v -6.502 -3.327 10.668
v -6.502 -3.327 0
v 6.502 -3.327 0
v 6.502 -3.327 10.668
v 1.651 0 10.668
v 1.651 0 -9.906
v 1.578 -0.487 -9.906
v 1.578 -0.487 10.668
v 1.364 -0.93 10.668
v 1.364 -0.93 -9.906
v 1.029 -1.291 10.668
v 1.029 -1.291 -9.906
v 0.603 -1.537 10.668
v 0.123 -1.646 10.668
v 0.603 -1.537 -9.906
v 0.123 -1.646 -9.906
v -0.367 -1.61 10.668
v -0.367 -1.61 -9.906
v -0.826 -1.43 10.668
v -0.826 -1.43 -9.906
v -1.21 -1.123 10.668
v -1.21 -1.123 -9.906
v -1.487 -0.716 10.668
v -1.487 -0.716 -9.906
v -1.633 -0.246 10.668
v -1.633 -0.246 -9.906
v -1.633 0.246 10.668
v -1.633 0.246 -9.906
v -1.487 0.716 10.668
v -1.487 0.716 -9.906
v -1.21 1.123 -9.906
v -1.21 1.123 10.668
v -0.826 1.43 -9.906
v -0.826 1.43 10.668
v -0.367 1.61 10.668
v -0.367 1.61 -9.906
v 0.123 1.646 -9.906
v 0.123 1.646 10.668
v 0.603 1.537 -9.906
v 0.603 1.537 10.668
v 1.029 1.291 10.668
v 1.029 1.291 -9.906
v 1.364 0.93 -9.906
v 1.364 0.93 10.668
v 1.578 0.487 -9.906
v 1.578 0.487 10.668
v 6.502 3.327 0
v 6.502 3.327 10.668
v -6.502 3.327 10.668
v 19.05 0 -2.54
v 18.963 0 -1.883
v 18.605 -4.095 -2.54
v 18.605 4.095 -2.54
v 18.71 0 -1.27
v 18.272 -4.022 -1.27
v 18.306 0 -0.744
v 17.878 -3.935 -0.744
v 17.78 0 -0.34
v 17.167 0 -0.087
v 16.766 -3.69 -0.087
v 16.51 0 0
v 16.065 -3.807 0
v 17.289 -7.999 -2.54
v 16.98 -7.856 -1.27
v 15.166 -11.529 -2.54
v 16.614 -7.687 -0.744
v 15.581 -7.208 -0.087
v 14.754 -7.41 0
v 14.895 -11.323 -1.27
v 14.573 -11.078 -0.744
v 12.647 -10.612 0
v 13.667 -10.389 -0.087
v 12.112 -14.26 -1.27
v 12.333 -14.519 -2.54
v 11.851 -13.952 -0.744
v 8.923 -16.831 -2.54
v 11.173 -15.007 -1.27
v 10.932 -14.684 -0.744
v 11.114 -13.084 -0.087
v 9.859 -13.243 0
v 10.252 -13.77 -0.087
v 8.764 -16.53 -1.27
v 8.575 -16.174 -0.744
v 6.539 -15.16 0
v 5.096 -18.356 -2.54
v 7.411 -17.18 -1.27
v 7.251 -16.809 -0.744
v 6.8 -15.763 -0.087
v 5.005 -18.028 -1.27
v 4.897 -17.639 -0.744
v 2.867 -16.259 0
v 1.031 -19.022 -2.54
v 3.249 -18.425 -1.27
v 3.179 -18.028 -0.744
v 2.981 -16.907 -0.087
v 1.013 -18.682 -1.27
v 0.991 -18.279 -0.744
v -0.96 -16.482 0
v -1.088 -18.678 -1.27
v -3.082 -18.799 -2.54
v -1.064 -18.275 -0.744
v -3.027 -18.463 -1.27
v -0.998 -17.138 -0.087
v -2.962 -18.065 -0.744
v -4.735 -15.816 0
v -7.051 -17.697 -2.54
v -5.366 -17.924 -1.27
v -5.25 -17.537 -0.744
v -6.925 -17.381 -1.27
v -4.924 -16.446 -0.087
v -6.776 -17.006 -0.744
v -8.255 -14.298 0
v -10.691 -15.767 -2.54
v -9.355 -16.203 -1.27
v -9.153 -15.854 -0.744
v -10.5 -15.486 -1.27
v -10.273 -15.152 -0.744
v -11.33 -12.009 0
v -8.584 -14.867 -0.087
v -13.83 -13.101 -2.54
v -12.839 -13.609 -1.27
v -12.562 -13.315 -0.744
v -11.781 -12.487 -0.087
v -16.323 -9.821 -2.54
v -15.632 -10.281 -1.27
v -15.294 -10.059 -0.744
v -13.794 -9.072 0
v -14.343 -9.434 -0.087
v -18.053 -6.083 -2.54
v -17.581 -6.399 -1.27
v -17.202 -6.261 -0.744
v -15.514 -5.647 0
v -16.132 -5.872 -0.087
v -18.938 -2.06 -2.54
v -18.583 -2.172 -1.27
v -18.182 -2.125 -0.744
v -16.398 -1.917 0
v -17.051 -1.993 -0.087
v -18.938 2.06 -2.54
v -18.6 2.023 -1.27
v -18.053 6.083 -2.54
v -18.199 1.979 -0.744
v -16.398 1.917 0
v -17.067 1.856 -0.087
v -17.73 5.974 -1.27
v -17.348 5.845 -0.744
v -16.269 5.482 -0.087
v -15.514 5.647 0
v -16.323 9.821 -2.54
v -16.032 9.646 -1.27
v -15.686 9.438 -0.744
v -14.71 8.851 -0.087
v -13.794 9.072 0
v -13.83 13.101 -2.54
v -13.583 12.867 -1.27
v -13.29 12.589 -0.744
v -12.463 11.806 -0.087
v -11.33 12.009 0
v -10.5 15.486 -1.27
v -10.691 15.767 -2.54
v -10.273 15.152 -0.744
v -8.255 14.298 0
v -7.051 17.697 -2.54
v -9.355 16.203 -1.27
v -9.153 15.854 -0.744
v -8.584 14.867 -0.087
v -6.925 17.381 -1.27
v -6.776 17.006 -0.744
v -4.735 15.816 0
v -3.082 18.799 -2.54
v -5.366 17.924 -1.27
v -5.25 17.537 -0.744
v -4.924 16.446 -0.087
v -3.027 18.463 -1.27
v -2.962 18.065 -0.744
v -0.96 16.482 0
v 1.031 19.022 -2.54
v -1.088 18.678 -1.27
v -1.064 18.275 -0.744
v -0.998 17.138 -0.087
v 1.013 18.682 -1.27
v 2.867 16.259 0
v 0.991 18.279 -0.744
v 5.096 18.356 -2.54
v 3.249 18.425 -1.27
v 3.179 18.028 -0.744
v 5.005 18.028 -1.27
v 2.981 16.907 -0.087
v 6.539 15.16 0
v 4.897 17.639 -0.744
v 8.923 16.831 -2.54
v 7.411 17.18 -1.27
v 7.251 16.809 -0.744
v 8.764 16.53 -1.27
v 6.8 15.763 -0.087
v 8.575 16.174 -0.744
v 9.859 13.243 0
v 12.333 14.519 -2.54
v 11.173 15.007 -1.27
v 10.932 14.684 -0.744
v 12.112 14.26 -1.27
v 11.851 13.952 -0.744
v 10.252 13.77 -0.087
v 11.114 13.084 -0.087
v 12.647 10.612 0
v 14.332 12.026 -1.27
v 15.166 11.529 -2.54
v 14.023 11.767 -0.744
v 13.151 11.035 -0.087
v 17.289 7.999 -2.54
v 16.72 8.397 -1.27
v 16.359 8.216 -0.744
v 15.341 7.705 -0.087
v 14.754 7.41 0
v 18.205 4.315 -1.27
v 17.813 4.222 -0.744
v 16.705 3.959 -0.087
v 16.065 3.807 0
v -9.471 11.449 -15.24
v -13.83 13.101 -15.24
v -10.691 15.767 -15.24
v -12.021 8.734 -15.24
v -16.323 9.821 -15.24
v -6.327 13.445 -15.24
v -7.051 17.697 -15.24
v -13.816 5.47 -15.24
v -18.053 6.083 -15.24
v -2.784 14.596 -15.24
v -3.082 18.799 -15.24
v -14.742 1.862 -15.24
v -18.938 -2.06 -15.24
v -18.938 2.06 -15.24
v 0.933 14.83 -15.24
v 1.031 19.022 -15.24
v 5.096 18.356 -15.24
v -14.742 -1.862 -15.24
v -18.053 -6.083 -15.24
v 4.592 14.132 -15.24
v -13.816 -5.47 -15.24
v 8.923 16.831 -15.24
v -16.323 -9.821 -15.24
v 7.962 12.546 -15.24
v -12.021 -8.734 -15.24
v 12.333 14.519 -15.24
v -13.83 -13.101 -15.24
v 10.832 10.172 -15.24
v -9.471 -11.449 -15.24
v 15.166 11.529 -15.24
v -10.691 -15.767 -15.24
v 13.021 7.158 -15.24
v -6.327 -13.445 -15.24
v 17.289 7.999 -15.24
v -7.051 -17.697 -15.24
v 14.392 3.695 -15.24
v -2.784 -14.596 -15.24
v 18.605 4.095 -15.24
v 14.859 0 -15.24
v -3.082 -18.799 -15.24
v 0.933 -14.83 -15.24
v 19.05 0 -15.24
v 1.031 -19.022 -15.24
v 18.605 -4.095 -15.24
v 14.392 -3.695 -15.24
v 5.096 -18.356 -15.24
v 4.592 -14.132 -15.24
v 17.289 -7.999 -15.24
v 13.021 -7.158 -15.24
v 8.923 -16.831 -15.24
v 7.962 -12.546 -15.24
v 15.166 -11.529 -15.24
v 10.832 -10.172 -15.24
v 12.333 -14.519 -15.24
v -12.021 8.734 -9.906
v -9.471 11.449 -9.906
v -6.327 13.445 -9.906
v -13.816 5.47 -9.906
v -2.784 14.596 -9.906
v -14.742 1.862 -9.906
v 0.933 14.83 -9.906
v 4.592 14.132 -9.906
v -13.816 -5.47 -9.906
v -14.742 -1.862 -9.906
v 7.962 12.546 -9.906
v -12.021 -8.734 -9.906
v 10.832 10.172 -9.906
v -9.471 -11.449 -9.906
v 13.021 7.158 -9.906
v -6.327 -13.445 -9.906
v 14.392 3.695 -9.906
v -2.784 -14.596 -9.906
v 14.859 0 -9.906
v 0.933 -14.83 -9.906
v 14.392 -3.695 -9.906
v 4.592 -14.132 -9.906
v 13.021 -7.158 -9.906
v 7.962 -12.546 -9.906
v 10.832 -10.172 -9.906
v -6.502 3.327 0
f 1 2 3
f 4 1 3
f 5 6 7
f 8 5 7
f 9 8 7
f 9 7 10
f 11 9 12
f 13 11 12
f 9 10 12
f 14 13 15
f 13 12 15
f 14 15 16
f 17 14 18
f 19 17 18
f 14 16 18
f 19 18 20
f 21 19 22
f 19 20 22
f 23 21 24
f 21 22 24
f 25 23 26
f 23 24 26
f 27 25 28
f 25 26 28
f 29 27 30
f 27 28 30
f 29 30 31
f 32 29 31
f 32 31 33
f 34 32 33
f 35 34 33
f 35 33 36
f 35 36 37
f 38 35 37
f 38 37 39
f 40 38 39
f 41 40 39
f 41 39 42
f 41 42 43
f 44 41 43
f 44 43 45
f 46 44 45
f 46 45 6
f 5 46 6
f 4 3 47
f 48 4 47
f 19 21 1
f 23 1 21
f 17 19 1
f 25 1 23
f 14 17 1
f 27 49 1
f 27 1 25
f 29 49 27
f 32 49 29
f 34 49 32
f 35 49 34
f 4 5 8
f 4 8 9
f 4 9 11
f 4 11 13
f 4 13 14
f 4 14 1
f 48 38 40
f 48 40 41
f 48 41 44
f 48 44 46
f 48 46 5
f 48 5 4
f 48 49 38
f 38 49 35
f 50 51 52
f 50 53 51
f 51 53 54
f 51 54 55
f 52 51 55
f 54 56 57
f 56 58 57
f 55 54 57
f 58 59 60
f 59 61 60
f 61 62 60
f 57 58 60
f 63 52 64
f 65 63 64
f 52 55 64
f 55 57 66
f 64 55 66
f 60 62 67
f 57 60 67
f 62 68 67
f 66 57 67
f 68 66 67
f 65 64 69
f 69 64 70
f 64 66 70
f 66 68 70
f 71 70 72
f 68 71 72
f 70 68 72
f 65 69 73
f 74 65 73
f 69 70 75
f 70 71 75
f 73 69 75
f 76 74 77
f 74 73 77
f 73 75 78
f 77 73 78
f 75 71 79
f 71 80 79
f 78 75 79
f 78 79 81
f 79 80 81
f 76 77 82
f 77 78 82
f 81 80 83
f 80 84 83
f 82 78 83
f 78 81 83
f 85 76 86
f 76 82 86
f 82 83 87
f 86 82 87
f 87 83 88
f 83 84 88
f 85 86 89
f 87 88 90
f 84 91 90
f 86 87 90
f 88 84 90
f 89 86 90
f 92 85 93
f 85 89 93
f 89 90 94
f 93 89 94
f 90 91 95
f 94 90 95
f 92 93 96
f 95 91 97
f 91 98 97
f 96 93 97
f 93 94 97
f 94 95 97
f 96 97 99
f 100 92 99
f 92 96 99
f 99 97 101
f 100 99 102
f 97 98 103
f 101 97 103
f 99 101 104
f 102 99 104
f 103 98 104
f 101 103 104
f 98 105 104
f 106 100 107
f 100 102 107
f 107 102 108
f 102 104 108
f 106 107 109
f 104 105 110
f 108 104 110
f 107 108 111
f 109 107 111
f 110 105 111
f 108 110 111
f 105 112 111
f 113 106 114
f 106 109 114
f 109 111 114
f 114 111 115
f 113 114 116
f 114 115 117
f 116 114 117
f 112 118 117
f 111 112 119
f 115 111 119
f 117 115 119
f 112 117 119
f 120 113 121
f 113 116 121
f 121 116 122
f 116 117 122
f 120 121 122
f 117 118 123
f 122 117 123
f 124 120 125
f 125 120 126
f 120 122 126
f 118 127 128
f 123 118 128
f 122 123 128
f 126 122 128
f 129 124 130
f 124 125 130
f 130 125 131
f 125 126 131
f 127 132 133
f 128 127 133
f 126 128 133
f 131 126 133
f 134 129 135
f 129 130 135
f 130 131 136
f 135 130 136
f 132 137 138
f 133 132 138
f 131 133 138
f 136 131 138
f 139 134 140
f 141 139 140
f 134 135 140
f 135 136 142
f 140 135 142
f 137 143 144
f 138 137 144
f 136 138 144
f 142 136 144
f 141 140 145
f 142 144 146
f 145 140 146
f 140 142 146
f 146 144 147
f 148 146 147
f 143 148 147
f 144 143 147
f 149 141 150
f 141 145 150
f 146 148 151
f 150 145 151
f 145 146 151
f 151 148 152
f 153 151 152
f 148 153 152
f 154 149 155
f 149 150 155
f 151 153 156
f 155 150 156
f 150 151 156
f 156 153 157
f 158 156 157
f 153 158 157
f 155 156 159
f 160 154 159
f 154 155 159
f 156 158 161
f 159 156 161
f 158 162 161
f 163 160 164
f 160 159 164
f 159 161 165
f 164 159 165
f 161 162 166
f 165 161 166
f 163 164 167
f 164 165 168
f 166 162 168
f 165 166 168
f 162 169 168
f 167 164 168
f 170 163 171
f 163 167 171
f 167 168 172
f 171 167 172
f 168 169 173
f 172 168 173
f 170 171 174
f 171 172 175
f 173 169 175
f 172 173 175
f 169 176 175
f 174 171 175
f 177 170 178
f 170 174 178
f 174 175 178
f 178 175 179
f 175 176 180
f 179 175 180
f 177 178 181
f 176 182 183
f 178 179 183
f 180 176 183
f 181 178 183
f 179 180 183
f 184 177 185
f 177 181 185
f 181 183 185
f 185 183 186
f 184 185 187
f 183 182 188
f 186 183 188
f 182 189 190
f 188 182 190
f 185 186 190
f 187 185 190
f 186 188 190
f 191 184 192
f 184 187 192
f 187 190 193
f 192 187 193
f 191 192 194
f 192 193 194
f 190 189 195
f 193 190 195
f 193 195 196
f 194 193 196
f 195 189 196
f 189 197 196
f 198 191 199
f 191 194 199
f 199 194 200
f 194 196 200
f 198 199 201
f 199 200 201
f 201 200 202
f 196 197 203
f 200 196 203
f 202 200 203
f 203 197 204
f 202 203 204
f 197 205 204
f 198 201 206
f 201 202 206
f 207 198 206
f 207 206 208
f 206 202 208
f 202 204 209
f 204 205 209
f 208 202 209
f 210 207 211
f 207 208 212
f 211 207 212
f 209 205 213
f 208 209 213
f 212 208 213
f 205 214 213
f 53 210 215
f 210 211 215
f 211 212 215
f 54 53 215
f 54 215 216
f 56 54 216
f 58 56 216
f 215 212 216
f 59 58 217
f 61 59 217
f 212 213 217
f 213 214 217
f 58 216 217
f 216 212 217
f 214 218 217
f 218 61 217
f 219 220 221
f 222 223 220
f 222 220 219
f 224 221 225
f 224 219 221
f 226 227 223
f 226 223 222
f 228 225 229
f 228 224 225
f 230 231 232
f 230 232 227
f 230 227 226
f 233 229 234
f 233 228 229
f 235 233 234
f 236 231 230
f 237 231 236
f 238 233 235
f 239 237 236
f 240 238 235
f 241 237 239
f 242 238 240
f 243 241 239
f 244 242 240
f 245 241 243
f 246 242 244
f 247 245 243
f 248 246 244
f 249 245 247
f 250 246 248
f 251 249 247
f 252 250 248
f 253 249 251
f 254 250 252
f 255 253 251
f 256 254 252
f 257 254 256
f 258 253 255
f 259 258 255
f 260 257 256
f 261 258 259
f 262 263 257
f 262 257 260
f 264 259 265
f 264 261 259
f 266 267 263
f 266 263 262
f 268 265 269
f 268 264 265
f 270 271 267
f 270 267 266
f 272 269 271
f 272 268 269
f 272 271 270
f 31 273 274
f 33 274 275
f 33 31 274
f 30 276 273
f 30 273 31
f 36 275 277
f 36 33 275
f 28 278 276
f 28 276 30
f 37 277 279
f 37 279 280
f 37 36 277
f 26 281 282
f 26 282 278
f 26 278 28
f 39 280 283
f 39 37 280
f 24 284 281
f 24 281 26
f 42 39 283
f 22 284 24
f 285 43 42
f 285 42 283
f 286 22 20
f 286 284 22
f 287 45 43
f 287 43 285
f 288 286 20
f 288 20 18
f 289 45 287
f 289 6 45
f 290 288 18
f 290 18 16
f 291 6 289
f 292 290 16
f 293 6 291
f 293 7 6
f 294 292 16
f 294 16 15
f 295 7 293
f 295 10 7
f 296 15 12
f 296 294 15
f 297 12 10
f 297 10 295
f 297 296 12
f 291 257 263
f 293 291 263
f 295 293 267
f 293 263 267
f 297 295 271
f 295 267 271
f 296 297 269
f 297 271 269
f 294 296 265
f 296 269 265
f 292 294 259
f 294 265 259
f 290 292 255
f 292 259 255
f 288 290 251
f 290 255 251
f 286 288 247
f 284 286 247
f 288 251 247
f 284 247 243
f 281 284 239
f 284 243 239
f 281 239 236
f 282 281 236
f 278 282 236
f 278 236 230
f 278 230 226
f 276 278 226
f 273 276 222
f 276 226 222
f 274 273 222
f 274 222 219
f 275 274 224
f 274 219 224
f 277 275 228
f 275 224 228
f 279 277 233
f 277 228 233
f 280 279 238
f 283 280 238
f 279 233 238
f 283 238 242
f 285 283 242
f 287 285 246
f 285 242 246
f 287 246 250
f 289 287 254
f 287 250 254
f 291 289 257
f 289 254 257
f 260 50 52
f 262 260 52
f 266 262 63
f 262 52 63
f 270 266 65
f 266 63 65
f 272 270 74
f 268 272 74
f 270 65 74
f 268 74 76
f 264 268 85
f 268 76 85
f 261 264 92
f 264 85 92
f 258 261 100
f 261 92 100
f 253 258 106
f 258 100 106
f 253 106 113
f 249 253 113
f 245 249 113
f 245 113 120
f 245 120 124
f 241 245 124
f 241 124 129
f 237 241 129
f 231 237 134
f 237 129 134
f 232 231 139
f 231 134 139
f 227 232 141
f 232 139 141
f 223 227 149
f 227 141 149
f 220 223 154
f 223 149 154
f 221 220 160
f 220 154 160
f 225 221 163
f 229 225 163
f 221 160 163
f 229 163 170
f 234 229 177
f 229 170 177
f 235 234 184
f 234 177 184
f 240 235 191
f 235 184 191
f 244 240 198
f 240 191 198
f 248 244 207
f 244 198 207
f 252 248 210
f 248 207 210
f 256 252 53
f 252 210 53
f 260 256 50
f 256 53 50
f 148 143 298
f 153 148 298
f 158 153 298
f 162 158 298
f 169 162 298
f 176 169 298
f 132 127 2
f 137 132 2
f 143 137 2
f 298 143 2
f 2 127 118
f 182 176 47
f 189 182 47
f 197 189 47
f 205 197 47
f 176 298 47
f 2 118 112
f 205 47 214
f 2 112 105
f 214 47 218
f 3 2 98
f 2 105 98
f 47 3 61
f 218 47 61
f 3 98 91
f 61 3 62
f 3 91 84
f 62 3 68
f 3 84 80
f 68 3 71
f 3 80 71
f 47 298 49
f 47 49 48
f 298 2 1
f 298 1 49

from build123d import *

# Parameters (mm, degrees)
F0_W     = 13.0048
F0_H     = 6.6548
F1_DEPTH = 10.668
F2_R     = 19.05
F3_DEPTH = 15.24
F4_R     = 2.54
F5_R     = 14.859
F6_DEPTH = 5.334
F7_R     = 1.651
F8_DEPTH = 21.59


with BuildPart() as f1:
    # F0 (on Top) → F1 (new body)
    with BuildSketch(Plane.XY):
        Rectangle(F0_W, F0_H)
    extrude(amount=F1_DEPTH)

    # F2 (on face) → F3 (join)
    with BuildSketch(Plane(origin=(0, 0, 0), x_dir=(1, 0, 0), z_dir=(0, 0, -1))):
        Circle(F2_R)
    extrude(amount=F3_DEPTH)

    # F4
    f4_edges = [f1.edges().sort_by_distance(p)[0] for p in [
        (-19.05, 0, 0),
    ]]
    fillet(f4_edges, radius=F4_R)

    # F5 (on face) → F6 (cut)
    with BuildSketch(Plane(origin=(0, 0, -15.24), x_dir=(1, 0, 0), z_dir=(0, 0, -1))):
        Circle(F5_R)
    extrude(amount=-F6_DEPTH, mode=Mode.SUBTRACT)

    # F7 (on face) → F8 (cut)
    with BuildSketch(Plane(origin=(0, 0, -9.906), x_dir=(1, 0, 0), z_dir=(0, 0, -1))):
        Circle(F7_R)
    extrude(amount=-F8_DEPTH, mode=Mode.SUBTRACT)


solid = f1.part
